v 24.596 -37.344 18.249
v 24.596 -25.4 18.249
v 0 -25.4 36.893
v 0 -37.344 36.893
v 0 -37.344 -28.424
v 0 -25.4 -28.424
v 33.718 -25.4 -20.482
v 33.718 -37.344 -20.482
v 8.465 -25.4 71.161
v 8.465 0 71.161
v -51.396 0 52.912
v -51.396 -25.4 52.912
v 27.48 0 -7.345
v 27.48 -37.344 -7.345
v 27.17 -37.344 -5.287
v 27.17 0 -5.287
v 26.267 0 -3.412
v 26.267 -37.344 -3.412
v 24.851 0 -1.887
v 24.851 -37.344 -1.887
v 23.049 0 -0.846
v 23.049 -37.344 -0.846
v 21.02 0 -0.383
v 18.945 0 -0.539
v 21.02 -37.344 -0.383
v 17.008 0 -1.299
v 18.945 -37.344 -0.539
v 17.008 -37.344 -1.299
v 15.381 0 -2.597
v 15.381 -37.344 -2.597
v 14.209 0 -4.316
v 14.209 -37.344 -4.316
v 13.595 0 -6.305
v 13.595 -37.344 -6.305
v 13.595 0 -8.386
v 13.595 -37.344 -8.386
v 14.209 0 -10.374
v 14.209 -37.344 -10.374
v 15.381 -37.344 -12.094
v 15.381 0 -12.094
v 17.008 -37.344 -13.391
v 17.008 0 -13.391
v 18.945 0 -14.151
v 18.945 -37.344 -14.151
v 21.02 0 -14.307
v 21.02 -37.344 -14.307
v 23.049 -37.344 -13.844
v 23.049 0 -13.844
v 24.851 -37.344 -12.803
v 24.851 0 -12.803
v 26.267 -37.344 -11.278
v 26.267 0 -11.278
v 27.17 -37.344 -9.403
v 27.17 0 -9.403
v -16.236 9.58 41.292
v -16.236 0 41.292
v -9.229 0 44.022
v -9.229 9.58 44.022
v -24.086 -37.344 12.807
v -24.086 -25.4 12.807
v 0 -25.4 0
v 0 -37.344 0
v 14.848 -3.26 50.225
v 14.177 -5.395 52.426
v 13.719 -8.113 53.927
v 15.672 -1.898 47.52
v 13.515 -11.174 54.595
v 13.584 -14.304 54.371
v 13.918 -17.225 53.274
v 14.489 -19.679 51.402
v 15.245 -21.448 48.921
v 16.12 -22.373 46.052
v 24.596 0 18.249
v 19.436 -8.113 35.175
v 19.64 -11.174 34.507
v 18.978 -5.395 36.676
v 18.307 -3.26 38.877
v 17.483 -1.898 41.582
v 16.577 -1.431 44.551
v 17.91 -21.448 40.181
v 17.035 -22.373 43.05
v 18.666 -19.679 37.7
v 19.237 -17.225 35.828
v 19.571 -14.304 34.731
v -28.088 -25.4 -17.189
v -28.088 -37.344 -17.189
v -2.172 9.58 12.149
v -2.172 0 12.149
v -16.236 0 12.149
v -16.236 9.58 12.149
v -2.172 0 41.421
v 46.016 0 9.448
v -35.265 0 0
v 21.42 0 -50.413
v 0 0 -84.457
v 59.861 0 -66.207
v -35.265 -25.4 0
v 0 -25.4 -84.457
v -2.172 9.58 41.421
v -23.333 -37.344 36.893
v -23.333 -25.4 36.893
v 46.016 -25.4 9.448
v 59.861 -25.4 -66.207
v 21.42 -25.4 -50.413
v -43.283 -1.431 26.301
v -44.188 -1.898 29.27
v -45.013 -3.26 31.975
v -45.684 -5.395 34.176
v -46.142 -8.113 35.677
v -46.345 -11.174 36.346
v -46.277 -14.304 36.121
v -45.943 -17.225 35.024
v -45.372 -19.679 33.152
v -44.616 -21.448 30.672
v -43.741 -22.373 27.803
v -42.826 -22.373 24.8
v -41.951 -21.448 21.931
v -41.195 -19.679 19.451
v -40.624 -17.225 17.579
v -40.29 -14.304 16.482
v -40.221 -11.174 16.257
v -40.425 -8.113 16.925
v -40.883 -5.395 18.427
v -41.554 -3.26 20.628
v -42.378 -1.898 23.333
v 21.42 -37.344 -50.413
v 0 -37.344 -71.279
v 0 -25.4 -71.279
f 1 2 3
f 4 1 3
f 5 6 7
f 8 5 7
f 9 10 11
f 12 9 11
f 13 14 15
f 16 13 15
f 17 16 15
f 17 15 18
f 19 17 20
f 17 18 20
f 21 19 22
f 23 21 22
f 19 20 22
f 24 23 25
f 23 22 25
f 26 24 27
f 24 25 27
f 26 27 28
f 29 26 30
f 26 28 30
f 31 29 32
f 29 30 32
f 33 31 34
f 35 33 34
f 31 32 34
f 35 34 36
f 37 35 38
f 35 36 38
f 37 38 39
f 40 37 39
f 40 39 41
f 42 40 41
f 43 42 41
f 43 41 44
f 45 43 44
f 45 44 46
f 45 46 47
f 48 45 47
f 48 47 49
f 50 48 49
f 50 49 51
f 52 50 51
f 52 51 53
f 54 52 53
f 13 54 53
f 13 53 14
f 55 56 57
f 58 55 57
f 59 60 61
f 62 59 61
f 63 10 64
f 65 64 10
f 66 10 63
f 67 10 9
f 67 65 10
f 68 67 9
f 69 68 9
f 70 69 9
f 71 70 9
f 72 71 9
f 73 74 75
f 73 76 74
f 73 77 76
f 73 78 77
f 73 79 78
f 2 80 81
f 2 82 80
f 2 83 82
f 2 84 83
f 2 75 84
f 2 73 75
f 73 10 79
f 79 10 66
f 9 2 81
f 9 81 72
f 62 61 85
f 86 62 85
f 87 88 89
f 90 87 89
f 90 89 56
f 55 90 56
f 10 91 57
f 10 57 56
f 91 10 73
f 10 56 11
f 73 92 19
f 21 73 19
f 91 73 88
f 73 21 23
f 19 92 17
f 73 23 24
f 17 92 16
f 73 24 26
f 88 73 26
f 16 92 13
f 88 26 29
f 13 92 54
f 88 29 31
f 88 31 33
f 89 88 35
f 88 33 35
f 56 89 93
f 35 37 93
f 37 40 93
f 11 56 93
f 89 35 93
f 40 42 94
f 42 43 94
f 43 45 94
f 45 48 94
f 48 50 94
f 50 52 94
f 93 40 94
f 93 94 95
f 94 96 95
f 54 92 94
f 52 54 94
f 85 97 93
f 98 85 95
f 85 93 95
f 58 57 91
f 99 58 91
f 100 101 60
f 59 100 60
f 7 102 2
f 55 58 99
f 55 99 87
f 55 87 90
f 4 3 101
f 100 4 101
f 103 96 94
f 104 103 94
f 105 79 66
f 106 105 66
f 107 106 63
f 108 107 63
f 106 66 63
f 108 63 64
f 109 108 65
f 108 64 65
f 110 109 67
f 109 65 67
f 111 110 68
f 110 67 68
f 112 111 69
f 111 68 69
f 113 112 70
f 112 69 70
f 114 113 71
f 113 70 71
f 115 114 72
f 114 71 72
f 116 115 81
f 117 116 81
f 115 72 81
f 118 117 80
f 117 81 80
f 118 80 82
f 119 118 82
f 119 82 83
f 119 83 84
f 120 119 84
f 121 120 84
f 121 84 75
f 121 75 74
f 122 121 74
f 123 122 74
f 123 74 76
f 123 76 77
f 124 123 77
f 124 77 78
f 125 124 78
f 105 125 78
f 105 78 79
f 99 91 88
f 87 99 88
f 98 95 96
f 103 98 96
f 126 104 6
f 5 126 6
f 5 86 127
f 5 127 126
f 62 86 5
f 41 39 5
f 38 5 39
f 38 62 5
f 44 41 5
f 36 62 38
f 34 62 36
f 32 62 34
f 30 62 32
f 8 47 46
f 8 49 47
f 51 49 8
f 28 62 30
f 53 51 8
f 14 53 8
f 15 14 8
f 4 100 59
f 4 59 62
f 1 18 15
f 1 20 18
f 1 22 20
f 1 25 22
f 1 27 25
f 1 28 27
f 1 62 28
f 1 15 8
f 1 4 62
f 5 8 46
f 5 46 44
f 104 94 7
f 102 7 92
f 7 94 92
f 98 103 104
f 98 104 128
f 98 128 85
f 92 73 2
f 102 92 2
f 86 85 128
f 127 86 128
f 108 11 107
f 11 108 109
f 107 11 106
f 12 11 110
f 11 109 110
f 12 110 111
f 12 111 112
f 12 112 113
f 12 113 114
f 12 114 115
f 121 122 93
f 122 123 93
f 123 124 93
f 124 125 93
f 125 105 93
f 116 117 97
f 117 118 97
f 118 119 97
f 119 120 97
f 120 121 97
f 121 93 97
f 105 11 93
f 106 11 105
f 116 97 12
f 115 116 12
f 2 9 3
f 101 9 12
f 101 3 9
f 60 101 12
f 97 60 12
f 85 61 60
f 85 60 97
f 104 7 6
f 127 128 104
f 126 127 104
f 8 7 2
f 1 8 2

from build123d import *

# Parameters (mm, degrees)
F1_DEPTH  = 25.4
F2_DEPTH  = 23.1580417603
F3_DEPTH  = 55.316273123
F4_R      = 10.5299090295
F5_DEPTH  = 108.9027523994
F7_DEPTH  = 11.9440481067
F8_R      = 6.9812840575
F9_DEPTH  = 59.2665076256
F11_DEPTH = 9.5802750438


with BuildPart() as f1:
    # F0 (on Front) → F1 (new body)
    with BuildSketch(Plane.XZ):
        Polygon((24.5958286973, 18.2494423054), (-35.2649310012, 0), (0, -84.4565883958), (59.8607596985, -66.2071460904), (0, -41.6113173931), align=None)
    extrude(amount=F1_DEPTH)

    # F2 (add): a face of the model
    f2_faces = [f1.faces().sort_by_distance(p)[0] for p in [
        (12.2979143487, -12.7, -11.6809375438),
    ]]
    extrude(f2_faces, amount=F2_DEPTH)

    # F3 (add): a face of the model
    f3_faces = [f1.faces().sort_by_distance(p)[0] for p in [
        (-5.3345511519, -12.7, 9.1247211527),
    ]]
    extrude(f3_faces, amount=F3_DEPTH)

    # F4 (on face) → F5 (cut)
    with BuildSketch(Plane(origin=(27.5947180099, 0, 8.412659926), x_dir=(0, 1, 0), z_dir=(0.956536014, 0, 0.2916142209))):
        with Locations((-11.9604282081, 37.7803184092)):
            Circle(F4_R)
    extrude(amount=-F5_DEPTH, mode=Mode.SUBTRACT)

    # F6 (on face) → F7 (join)
    with BuildSketch(Plane.XZ.offset(25.4)):
        Polygon((0, 36.8930399418), (-23.3332291245, 36.8930399418), (-24.0859165788, 12.8071308136), (0, 0), (-28.0878045399, -17.1886233206), (0, -71.279310042), (21.4203697409, -50.4126047044), (0, -28.4238799673), (33.7182840896, -20.4822248551), (24.5958286973, 18.2494423054), align=None)
    extrude(amount=F7_DEPTH)

    # F8 (on face) → F9 (cut)
    with BuildSketch(Plane.XZ.offset(37.3440481067)):
        with Locations((20.4987134784, -7.3451003991)):
            Circle(F8_R)
    extrude(amount=-F9_DEPTH, mode=Mode.SUBTRACT)

    # F10 (on face) → F11 (join)
    with BuildSketch(Plane(origin=(0, 0, 0), x_dir=(-1, 0, 0), z_dir=(0, 1, 0))):
        Polygon((16.2364837848, 12.1487083648), (16.2364837848, 41.2922068478), (9.2287091538, 44.0222509205), (2.1720913557, 41.4210605836), (2.1720913557, 12.1487083648), align=None)
    extrude(amount=F11_DEPTH)


solid = f1.part
